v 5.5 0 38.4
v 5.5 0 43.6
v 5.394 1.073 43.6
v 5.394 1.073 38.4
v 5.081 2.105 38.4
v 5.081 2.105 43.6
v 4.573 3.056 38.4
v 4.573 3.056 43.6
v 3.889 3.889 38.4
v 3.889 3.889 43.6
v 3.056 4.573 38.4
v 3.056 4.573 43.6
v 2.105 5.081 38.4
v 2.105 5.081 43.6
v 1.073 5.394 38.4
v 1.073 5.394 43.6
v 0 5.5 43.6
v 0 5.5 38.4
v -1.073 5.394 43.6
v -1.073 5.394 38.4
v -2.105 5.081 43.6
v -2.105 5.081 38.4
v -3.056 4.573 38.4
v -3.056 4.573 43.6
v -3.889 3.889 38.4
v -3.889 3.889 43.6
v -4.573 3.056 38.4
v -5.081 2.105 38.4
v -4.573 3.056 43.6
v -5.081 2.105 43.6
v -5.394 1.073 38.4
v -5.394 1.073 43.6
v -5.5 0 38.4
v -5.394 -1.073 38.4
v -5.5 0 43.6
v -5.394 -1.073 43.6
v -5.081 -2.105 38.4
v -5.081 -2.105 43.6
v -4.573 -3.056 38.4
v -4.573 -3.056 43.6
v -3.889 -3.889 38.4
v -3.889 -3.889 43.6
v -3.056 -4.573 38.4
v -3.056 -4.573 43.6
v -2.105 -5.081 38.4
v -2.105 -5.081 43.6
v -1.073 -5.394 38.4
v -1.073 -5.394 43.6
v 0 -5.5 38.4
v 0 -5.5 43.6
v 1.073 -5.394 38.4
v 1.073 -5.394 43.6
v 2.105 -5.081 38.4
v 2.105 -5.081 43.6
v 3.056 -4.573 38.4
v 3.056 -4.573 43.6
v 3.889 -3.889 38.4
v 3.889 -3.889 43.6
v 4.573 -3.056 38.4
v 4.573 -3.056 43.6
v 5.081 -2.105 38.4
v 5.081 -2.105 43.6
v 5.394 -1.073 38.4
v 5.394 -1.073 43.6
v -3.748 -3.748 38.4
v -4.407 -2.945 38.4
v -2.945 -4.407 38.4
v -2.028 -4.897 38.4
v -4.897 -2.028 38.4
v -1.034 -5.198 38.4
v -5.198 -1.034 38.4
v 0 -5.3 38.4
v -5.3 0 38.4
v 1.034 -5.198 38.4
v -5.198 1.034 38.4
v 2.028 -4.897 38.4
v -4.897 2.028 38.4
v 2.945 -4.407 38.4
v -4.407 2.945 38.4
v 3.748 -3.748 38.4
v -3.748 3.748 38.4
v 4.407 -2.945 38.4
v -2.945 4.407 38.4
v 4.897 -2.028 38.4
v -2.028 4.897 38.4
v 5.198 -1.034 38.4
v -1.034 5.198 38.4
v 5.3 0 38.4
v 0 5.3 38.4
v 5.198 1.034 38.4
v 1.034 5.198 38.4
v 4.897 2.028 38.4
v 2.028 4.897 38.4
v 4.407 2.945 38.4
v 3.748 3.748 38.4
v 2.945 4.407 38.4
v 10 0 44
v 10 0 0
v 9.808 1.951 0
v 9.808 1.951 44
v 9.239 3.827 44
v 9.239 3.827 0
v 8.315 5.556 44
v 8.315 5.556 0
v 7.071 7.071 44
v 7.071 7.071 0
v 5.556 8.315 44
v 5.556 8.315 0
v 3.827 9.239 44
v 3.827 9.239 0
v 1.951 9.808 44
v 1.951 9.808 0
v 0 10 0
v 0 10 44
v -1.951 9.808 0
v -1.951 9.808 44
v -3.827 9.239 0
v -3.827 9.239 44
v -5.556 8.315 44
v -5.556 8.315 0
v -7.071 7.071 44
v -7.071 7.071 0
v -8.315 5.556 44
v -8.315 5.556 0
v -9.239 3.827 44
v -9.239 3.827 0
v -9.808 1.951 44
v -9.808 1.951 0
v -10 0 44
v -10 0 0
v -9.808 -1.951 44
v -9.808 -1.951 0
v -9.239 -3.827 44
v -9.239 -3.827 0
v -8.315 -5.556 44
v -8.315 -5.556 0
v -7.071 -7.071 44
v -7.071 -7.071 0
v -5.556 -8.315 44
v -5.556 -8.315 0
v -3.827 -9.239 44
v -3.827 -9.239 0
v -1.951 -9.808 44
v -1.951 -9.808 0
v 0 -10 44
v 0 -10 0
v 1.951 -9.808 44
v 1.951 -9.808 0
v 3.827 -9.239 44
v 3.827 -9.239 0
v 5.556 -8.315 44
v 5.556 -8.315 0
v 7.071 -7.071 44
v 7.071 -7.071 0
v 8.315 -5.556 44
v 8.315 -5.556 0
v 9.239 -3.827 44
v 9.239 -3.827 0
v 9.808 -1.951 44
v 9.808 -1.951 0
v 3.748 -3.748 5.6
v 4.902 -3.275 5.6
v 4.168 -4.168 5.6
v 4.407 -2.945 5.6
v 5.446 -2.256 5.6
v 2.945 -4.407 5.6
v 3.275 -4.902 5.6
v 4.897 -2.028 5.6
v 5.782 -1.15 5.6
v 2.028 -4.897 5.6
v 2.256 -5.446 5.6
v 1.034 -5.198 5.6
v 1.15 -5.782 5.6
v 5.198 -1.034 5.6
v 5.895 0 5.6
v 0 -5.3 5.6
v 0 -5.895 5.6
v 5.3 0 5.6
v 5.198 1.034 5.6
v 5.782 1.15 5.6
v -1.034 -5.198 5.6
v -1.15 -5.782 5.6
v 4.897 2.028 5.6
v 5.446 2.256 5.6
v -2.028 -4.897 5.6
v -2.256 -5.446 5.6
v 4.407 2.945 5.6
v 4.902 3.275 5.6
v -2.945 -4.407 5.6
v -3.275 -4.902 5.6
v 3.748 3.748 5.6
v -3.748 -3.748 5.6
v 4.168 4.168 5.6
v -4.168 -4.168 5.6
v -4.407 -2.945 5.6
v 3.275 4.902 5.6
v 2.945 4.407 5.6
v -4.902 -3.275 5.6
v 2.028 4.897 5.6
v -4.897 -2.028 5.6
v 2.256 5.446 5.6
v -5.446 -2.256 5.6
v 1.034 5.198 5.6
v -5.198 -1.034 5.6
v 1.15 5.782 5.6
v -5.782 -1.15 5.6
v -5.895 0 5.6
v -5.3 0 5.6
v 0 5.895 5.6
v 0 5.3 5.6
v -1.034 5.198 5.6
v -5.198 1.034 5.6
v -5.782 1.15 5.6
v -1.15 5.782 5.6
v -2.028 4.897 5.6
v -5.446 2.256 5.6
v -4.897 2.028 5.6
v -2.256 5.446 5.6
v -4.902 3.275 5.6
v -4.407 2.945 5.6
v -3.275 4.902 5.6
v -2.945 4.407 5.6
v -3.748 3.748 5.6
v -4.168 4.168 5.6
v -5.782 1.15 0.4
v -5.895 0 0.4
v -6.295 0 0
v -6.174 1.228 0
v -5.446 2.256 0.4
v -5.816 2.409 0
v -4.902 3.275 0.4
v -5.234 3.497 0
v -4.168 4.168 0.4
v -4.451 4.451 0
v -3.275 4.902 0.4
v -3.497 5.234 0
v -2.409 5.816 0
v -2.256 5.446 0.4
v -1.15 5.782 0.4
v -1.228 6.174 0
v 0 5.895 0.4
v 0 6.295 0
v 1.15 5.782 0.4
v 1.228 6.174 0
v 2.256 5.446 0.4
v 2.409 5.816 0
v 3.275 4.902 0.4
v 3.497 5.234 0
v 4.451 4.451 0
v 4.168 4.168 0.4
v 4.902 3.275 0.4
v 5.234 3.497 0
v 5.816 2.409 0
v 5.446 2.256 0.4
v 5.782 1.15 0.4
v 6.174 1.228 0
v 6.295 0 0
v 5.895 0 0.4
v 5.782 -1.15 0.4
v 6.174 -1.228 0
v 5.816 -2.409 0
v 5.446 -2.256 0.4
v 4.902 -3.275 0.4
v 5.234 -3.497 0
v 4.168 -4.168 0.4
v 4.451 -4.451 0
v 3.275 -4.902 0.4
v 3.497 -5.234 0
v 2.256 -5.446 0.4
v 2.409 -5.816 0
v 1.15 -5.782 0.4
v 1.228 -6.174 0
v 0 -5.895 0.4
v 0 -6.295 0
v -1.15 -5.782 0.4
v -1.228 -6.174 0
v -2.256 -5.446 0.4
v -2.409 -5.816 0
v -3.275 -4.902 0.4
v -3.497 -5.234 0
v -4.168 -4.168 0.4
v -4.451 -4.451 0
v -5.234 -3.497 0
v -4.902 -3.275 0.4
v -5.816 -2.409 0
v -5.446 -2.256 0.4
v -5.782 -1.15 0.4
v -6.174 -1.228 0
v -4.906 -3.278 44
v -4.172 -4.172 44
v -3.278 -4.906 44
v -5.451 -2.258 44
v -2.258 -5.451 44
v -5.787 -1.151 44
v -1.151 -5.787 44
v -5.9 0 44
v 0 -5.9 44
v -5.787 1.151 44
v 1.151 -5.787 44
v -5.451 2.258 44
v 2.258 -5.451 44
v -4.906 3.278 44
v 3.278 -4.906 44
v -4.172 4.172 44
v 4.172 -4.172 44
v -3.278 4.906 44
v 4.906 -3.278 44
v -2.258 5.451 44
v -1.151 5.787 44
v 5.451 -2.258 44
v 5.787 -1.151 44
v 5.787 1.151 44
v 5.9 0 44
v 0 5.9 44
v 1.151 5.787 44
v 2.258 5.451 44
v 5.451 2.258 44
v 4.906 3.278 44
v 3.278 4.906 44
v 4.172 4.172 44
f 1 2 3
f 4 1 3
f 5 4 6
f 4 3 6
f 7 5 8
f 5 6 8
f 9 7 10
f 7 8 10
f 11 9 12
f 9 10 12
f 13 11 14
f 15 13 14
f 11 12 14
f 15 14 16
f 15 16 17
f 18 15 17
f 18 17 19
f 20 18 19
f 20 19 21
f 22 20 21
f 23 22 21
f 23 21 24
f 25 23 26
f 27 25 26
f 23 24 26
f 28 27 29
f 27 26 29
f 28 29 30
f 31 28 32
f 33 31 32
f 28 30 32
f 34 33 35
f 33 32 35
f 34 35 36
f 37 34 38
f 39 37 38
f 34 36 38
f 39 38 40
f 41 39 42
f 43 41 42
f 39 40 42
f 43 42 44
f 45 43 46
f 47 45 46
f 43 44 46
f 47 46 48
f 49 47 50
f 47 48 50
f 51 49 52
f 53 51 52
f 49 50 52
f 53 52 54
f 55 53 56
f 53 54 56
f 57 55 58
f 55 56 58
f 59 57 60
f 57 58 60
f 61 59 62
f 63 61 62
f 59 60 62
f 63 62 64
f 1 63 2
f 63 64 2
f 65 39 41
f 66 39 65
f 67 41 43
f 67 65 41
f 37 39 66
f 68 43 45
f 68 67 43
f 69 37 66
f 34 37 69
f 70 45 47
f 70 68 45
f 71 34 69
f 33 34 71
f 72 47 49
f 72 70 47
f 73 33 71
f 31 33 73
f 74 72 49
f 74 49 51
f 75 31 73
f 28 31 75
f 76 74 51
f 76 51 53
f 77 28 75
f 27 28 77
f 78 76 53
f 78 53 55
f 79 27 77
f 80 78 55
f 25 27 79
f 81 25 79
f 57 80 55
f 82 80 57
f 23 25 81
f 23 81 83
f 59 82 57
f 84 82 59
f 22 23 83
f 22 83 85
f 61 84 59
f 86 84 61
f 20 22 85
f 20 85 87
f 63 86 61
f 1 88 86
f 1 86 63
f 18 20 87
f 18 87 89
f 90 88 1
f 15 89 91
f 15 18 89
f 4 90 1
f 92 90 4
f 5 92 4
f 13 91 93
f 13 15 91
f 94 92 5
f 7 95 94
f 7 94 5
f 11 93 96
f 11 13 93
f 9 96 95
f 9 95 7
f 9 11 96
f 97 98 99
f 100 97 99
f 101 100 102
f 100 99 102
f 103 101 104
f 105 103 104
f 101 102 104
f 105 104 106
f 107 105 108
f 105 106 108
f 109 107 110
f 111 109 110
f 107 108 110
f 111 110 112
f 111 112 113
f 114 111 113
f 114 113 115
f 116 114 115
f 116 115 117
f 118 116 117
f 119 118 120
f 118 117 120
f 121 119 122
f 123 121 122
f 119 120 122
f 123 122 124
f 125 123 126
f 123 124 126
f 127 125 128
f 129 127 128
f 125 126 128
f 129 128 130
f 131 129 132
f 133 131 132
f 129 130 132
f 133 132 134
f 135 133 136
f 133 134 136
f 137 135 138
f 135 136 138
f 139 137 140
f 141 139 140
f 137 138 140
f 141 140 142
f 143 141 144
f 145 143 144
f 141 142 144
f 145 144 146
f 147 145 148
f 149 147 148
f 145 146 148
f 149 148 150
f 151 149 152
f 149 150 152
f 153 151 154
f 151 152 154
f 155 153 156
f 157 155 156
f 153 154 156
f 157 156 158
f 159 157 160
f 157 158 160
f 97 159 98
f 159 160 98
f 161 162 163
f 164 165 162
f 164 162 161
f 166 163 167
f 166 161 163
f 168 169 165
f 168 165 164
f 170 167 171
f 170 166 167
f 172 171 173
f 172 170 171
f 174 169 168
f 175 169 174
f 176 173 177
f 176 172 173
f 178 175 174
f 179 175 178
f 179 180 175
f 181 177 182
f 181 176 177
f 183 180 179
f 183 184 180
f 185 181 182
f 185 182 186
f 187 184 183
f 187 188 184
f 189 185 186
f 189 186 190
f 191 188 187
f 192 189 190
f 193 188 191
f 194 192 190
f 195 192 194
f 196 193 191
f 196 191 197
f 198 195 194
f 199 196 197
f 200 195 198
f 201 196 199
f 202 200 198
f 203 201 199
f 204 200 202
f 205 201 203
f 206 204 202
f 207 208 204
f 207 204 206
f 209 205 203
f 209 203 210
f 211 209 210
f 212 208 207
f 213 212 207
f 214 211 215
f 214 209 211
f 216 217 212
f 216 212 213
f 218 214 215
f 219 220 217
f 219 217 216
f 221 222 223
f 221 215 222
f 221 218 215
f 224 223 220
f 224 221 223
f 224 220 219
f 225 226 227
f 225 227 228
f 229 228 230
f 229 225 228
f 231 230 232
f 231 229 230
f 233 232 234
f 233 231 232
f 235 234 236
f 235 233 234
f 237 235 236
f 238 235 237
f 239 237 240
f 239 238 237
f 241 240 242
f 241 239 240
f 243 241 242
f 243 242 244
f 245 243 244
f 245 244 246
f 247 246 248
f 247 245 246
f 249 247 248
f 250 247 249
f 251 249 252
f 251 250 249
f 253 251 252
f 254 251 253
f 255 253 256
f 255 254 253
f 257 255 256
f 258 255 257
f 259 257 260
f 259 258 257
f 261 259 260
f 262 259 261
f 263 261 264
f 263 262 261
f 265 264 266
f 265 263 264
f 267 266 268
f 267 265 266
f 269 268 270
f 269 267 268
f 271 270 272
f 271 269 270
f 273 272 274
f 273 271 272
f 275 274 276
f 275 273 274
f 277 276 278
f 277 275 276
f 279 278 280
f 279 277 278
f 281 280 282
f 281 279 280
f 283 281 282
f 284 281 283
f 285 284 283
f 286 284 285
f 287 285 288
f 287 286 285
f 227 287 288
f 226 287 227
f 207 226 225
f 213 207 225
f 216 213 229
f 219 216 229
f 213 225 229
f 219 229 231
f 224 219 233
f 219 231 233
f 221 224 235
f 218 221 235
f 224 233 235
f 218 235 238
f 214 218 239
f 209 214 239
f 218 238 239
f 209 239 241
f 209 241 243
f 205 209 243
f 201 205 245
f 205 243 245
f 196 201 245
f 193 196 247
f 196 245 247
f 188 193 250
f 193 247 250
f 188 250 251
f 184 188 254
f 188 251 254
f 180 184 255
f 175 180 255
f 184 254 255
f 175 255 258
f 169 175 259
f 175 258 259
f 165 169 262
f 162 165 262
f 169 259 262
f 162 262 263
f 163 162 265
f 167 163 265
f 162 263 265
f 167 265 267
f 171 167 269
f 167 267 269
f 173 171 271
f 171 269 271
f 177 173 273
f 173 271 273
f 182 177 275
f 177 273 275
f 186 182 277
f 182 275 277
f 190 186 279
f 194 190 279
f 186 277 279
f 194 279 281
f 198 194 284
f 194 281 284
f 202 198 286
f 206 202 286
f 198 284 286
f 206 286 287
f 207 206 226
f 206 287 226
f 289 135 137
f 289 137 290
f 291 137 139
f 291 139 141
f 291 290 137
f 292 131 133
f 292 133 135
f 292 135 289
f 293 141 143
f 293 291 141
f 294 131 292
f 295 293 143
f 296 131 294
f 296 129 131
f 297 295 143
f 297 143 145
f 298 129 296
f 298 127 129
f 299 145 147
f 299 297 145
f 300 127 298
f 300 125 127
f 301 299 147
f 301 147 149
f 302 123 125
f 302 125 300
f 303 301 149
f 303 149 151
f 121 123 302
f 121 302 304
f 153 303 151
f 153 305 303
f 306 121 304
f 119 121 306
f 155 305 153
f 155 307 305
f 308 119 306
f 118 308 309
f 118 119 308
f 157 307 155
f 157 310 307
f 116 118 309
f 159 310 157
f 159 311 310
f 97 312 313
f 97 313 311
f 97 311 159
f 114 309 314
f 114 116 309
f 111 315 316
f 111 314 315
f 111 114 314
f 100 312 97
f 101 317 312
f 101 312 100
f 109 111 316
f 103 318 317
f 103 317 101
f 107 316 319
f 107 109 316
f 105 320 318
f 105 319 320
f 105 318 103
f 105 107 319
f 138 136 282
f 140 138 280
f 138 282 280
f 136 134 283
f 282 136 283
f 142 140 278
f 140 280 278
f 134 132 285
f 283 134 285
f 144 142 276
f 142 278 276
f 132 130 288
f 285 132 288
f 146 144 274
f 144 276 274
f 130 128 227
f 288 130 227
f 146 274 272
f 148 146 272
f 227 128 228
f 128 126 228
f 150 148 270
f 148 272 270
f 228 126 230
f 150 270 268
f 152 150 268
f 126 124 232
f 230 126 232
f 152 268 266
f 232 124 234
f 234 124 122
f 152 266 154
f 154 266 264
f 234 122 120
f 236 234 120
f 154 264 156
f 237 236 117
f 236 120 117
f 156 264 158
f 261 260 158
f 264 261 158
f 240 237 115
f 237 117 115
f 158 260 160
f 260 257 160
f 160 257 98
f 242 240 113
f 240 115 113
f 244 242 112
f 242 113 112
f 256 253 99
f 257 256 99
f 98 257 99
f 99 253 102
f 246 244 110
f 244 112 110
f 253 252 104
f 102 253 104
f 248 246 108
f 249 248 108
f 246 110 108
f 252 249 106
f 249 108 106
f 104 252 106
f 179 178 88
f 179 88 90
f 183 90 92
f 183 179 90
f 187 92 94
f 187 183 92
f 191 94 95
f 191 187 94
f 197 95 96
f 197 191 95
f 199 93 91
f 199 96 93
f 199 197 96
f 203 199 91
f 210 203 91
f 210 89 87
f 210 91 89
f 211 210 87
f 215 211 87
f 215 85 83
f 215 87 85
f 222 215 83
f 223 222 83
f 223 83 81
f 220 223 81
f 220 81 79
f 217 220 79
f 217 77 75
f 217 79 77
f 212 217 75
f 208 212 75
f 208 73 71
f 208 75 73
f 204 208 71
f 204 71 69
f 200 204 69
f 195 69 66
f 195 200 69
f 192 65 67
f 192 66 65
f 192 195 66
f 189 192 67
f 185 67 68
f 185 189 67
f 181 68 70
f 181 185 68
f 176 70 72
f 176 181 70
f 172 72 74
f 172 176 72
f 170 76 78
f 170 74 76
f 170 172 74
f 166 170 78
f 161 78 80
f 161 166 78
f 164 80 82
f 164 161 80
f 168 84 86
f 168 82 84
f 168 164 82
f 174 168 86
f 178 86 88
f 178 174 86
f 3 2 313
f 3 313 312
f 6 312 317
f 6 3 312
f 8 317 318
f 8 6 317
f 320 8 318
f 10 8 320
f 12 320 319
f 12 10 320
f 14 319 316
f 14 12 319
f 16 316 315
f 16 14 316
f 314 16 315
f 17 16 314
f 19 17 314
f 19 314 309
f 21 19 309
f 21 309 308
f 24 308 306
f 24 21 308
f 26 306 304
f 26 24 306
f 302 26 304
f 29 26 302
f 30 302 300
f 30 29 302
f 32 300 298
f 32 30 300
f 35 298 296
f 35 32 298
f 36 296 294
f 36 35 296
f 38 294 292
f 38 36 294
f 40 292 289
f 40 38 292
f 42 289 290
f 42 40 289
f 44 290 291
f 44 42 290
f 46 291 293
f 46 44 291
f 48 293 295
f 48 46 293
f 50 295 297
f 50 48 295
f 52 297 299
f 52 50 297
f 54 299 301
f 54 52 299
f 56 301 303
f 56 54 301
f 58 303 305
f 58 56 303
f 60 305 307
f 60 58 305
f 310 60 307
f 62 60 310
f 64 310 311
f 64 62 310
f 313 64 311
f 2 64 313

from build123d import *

# Parameters (mm, degrees)
SKIZZE1_R                       = 10
SKIZZE1_R_2                     = 5.3
AUFSATZ_LINEAR_AUSTRAGEN1_DEPTH = 44
SKIZZE2_R                       = 5.5
SCHNITT_LINEAR_AUSTRAGEN1_DEPTH = 5.6
SKIZZE3_R                       = 5.894998856
SCHNITT_LINEAR_AUSTRAGEN2_DEPTH = 5.6
FASE1_SIZE                      = 0.4


with BuildPart() as part:
    # Skizze1 → Aufsatz-Linear austragen1 (new body)
    with BuildSketch(Plane.XY):
        Circle(SKIZZE1_R)
        Circle(SKIZZE1_R_2, mode=Mode.SUBTRACT)
    extrude(amount=AUFSATZ_LINEAR_AUSTRAGEN1_DEPTH)

    # Skizze2 → Schnitt-Linear austragen1 (cut)
    with BuildSketch(Plane.XY.offset(44)):
        Circle(SKIZZE2_R)
    extrude(amount=-SCHNITT_LINEAR_AUSTRAGEN1_DEPTH, mode=Mode.SUBTRACT)

    # Skizze3 → Schnitt-Linear austragen2 (cut)
    with BuildSketch(Plane(origin=(0, 0, 0), x_dir=(-1, 0, 0), z_dir=(0, 0, -1))):
        Circle(SKIZZE3_R)
    extrude(amount=-SCHNITT_LINEAR_AUSTRAGEN2_DEPTH, mode=Mode.SUBTRACT)

    # Fase1
    fase1_edges = [part.edges().sort_by_distance(p)[0] for p in [
        (-5.5, 0, 44),
        (5.894998856, 0, 0),
    ]]
    chamfer(fase1_edges, length=FASE1_SIZE)


solid = part.part
